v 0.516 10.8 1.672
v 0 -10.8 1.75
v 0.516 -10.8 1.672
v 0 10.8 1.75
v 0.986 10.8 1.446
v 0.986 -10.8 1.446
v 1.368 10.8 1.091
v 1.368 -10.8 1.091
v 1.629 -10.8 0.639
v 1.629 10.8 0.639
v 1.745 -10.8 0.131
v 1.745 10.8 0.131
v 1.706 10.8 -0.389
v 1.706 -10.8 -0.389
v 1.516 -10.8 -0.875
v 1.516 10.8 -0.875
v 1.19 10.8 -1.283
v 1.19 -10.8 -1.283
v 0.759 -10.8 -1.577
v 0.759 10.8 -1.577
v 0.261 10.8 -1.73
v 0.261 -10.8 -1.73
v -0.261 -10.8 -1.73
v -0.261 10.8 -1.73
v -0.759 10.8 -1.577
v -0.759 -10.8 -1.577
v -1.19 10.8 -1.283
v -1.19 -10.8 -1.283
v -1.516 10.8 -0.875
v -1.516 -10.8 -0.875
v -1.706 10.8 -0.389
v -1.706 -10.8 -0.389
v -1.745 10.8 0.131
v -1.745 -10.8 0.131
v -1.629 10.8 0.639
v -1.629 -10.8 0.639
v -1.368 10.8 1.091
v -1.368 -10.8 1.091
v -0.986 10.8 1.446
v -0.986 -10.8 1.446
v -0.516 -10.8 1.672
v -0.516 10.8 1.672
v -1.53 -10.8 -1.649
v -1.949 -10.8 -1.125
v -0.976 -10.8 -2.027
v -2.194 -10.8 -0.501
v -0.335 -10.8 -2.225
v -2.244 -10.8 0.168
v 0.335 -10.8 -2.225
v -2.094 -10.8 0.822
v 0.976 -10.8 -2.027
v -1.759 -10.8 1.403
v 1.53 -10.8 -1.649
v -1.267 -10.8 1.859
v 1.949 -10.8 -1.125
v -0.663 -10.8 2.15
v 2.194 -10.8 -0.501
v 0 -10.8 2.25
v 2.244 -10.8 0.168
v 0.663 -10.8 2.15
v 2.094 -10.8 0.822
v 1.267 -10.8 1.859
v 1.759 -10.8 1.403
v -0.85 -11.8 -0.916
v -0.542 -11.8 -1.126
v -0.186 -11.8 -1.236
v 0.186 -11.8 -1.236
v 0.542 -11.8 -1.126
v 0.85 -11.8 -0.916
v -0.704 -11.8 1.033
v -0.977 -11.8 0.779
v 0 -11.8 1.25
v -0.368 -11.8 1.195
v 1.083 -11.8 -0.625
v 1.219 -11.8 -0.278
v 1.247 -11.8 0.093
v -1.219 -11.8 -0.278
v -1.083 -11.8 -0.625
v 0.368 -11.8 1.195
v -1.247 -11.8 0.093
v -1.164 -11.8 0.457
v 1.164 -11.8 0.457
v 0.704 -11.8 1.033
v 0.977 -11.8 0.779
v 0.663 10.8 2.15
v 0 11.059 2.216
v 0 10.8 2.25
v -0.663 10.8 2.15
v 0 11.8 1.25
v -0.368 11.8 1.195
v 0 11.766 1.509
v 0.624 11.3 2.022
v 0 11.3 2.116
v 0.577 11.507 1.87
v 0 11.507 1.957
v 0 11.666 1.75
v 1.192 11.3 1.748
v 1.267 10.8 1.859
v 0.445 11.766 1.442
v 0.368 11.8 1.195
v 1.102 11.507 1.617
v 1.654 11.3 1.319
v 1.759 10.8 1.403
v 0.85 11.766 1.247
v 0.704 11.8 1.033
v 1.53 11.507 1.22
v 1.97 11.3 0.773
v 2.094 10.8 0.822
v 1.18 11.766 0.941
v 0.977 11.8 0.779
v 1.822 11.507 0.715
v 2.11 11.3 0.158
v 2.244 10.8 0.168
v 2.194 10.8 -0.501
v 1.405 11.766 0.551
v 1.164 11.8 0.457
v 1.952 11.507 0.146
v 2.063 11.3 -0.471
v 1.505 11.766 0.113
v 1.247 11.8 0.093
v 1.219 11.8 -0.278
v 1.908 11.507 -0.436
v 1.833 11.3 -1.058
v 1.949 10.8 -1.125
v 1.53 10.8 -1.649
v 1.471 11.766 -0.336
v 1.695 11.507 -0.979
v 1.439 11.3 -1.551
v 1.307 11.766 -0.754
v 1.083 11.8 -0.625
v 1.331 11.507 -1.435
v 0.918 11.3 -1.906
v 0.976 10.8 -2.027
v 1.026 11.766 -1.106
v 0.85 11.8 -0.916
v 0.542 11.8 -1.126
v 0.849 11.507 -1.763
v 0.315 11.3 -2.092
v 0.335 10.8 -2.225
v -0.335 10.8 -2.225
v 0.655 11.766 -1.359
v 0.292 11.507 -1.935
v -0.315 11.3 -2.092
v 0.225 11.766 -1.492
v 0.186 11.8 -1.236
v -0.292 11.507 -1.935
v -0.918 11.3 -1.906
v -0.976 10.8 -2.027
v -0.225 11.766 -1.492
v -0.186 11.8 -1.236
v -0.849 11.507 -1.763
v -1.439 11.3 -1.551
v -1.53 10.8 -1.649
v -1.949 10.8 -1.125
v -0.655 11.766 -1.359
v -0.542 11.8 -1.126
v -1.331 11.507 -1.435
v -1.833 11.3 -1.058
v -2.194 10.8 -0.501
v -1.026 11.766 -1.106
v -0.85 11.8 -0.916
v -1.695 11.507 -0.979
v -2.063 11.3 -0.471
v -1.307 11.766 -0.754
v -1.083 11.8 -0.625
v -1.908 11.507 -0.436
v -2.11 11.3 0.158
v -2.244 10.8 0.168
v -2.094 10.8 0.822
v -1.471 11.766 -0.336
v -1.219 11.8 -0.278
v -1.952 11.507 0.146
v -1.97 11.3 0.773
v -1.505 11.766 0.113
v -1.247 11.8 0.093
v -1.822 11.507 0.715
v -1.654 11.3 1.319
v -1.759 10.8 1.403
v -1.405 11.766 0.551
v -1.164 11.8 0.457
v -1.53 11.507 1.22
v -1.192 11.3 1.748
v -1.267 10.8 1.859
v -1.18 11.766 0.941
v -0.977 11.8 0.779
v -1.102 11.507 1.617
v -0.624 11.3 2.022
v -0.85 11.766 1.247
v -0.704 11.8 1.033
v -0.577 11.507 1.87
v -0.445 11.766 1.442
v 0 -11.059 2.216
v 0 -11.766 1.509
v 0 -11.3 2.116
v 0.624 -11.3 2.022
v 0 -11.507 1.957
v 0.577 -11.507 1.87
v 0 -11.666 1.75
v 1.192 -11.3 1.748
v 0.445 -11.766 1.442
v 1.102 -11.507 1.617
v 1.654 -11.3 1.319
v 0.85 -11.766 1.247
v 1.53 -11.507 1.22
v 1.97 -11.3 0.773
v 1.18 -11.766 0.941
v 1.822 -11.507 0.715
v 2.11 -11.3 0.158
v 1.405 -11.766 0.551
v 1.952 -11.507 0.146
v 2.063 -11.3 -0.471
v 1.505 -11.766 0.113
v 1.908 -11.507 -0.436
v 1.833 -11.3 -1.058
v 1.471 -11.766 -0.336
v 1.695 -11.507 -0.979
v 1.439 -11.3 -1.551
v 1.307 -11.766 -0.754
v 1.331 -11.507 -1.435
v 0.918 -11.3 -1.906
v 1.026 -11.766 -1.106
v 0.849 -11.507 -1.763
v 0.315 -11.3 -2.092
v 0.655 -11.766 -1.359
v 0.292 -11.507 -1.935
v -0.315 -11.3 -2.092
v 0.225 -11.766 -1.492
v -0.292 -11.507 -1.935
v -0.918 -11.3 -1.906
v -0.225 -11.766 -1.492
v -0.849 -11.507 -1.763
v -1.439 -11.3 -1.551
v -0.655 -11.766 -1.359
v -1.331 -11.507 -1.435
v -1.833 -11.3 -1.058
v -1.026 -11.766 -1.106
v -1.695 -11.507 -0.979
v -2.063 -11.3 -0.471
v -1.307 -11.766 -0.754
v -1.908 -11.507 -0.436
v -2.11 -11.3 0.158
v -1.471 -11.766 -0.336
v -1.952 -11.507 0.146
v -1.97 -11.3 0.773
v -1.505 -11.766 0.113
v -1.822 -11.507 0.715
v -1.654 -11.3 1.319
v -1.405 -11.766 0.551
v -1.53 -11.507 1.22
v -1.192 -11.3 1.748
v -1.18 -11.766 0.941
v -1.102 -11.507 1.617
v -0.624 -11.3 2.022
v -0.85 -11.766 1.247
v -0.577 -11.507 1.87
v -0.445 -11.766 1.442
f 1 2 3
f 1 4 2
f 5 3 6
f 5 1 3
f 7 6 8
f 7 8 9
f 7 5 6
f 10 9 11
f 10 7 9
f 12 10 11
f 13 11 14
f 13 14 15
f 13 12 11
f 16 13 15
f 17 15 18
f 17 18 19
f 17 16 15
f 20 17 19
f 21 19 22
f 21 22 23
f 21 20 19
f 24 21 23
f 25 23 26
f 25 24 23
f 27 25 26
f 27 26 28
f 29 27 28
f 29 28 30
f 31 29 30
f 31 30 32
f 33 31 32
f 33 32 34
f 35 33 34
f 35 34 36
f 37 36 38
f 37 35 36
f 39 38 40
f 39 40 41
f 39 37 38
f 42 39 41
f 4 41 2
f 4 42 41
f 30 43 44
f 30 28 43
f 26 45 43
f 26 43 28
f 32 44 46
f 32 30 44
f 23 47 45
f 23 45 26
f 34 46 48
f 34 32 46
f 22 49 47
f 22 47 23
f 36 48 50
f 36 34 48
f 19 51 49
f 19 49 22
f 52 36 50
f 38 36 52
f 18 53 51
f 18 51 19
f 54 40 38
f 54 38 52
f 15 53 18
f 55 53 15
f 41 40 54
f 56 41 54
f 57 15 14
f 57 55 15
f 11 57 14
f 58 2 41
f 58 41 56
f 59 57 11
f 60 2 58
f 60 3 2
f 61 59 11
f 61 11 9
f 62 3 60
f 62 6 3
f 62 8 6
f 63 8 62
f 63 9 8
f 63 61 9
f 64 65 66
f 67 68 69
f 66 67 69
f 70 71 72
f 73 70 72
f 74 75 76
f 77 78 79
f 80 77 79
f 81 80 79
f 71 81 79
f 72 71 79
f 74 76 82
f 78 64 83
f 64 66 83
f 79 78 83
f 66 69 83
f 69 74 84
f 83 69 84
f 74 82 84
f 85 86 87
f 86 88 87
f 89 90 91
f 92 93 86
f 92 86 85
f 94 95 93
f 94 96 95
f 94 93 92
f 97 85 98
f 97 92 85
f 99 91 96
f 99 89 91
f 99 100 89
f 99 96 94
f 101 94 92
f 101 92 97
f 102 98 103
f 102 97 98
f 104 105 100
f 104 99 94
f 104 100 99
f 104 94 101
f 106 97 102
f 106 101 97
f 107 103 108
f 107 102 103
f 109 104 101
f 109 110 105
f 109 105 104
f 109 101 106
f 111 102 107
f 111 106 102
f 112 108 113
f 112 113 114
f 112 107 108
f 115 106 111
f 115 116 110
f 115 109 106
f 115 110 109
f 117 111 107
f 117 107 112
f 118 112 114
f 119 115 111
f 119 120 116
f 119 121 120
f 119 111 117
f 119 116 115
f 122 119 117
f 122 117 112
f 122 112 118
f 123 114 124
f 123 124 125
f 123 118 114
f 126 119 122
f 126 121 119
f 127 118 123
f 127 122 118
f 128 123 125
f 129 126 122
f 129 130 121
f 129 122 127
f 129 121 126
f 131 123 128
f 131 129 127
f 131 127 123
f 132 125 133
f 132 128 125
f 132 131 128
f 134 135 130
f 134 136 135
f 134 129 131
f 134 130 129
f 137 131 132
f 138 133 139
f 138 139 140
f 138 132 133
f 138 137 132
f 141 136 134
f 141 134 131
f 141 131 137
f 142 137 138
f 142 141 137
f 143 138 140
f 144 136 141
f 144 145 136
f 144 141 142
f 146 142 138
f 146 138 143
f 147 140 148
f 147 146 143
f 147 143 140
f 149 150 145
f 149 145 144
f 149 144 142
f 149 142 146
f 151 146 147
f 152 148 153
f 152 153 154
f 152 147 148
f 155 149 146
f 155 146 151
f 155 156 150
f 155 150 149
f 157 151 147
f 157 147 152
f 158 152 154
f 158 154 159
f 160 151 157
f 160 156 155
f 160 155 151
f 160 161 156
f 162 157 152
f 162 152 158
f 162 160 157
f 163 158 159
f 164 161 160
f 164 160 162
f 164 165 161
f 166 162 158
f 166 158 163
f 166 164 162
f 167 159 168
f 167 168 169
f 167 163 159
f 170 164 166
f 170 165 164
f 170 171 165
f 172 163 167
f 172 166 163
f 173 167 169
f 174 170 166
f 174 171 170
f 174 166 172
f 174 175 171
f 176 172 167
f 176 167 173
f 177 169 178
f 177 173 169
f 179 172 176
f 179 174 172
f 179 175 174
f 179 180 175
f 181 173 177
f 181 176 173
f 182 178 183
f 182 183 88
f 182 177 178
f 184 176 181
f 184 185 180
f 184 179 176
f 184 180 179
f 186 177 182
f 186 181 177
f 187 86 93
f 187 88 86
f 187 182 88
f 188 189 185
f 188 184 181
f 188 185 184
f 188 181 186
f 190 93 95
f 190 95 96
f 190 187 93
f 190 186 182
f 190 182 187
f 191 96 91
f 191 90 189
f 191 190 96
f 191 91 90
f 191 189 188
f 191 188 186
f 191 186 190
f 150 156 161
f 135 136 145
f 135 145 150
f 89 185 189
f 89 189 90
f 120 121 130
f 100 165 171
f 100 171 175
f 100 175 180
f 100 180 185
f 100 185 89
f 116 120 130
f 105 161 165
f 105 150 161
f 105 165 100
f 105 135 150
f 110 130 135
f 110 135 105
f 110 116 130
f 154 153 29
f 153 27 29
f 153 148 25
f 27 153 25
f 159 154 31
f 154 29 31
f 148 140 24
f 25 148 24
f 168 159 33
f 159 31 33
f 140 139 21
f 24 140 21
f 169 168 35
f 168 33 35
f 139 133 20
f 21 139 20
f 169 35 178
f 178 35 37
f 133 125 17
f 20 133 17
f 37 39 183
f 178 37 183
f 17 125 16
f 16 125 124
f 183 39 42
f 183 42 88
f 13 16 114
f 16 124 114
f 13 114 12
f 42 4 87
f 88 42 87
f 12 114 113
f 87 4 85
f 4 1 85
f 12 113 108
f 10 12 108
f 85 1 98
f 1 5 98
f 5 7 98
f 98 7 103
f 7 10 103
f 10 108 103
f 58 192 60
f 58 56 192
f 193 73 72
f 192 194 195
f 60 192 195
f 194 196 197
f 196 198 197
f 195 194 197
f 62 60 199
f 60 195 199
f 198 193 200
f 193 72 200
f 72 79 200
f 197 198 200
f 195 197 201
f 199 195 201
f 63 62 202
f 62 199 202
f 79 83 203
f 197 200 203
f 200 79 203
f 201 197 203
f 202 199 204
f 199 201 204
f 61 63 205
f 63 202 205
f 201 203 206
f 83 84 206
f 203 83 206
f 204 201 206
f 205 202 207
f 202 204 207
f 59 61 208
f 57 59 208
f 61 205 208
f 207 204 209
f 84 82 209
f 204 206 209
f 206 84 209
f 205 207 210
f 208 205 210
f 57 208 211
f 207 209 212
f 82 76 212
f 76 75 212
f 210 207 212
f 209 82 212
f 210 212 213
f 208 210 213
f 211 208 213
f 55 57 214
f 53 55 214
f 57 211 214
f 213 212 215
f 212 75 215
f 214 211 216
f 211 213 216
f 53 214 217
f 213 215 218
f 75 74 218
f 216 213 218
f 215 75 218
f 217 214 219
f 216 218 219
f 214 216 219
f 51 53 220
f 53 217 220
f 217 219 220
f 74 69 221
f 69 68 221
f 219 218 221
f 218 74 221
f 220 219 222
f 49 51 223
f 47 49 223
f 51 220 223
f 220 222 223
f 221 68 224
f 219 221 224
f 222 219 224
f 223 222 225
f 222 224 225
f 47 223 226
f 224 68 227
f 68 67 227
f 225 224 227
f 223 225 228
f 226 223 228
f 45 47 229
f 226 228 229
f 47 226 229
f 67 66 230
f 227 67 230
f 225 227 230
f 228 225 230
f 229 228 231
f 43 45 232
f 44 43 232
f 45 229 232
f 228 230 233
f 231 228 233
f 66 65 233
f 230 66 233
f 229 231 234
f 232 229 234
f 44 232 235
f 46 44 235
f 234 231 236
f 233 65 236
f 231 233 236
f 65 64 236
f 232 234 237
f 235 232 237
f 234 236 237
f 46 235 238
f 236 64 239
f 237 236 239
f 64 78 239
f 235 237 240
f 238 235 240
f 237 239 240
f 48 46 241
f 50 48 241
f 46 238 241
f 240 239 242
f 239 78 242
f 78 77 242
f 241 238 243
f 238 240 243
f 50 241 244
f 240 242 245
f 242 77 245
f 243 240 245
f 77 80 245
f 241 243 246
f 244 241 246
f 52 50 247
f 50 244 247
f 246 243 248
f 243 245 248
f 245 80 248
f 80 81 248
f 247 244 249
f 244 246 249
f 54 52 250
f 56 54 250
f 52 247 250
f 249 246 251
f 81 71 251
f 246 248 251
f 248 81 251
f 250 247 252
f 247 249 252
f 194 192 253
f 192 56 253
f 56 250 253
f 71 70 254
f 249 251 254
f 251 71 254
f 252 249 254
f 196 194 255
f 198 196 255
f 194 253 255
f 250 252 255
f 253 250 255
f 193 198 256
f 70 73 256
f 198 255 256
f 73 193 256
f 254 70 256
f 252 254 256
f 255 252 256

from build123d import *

# Parameters (mm, degrees)
SKETCH1_R           = 1.75
BOSS_EXTRUDE1_DEPTH = 11.3
SKETCH2_R           = 2.25
BOSS_EXTRUDE2_DEPTH = 0.5
FILLET2_R           = 1


with BuildPart() as part:
    # Sketch1 → Boss-Extrude1 (new, symmetric)
    with BuildSketch(Plane(origin=(0, 0, 0), x_dir=(1, 0, 0), z_dir=(0, 1, 0))):
        with Locations(Location((0, 0, 0), (0, 0, 270))):
            Circle(SKETCH1_R)
    extrude(amount=BOSS_EXTRUDE1_DEPTH, both=True)

    # Sketch2 → Boss-Extrude2 (add, symmetric)
    with BuildSketch(Plane(origin=(0, 11.3, 0), x_dir=(1, 0, 0), z_dir=(0, 1, 0))):
        with Locations(Location((0, 0, 0), (0, 0, 270))):
            Circle(SKETCH2_R)
    boss_extrude2 = extrude(amount=BOSS_EXTRUDE2_DEPTH, both=True)

    # Mirror1: Boss-Extrude2 across plane
    add(boss_extrude2.mirror(Plane.ZX))

    # Fillet2
    fillet2_edges = [part.edges().sort_by_distance(p)[0] for p in [
        (0, -11.8, -2.25),
        (0, 11.8, -2.25),
    ]]
    fillet(fillet2_edges, radius=FILLET2_R - 0.0001)  # a hair under: the kernel refuses the full size


solid = part.part
